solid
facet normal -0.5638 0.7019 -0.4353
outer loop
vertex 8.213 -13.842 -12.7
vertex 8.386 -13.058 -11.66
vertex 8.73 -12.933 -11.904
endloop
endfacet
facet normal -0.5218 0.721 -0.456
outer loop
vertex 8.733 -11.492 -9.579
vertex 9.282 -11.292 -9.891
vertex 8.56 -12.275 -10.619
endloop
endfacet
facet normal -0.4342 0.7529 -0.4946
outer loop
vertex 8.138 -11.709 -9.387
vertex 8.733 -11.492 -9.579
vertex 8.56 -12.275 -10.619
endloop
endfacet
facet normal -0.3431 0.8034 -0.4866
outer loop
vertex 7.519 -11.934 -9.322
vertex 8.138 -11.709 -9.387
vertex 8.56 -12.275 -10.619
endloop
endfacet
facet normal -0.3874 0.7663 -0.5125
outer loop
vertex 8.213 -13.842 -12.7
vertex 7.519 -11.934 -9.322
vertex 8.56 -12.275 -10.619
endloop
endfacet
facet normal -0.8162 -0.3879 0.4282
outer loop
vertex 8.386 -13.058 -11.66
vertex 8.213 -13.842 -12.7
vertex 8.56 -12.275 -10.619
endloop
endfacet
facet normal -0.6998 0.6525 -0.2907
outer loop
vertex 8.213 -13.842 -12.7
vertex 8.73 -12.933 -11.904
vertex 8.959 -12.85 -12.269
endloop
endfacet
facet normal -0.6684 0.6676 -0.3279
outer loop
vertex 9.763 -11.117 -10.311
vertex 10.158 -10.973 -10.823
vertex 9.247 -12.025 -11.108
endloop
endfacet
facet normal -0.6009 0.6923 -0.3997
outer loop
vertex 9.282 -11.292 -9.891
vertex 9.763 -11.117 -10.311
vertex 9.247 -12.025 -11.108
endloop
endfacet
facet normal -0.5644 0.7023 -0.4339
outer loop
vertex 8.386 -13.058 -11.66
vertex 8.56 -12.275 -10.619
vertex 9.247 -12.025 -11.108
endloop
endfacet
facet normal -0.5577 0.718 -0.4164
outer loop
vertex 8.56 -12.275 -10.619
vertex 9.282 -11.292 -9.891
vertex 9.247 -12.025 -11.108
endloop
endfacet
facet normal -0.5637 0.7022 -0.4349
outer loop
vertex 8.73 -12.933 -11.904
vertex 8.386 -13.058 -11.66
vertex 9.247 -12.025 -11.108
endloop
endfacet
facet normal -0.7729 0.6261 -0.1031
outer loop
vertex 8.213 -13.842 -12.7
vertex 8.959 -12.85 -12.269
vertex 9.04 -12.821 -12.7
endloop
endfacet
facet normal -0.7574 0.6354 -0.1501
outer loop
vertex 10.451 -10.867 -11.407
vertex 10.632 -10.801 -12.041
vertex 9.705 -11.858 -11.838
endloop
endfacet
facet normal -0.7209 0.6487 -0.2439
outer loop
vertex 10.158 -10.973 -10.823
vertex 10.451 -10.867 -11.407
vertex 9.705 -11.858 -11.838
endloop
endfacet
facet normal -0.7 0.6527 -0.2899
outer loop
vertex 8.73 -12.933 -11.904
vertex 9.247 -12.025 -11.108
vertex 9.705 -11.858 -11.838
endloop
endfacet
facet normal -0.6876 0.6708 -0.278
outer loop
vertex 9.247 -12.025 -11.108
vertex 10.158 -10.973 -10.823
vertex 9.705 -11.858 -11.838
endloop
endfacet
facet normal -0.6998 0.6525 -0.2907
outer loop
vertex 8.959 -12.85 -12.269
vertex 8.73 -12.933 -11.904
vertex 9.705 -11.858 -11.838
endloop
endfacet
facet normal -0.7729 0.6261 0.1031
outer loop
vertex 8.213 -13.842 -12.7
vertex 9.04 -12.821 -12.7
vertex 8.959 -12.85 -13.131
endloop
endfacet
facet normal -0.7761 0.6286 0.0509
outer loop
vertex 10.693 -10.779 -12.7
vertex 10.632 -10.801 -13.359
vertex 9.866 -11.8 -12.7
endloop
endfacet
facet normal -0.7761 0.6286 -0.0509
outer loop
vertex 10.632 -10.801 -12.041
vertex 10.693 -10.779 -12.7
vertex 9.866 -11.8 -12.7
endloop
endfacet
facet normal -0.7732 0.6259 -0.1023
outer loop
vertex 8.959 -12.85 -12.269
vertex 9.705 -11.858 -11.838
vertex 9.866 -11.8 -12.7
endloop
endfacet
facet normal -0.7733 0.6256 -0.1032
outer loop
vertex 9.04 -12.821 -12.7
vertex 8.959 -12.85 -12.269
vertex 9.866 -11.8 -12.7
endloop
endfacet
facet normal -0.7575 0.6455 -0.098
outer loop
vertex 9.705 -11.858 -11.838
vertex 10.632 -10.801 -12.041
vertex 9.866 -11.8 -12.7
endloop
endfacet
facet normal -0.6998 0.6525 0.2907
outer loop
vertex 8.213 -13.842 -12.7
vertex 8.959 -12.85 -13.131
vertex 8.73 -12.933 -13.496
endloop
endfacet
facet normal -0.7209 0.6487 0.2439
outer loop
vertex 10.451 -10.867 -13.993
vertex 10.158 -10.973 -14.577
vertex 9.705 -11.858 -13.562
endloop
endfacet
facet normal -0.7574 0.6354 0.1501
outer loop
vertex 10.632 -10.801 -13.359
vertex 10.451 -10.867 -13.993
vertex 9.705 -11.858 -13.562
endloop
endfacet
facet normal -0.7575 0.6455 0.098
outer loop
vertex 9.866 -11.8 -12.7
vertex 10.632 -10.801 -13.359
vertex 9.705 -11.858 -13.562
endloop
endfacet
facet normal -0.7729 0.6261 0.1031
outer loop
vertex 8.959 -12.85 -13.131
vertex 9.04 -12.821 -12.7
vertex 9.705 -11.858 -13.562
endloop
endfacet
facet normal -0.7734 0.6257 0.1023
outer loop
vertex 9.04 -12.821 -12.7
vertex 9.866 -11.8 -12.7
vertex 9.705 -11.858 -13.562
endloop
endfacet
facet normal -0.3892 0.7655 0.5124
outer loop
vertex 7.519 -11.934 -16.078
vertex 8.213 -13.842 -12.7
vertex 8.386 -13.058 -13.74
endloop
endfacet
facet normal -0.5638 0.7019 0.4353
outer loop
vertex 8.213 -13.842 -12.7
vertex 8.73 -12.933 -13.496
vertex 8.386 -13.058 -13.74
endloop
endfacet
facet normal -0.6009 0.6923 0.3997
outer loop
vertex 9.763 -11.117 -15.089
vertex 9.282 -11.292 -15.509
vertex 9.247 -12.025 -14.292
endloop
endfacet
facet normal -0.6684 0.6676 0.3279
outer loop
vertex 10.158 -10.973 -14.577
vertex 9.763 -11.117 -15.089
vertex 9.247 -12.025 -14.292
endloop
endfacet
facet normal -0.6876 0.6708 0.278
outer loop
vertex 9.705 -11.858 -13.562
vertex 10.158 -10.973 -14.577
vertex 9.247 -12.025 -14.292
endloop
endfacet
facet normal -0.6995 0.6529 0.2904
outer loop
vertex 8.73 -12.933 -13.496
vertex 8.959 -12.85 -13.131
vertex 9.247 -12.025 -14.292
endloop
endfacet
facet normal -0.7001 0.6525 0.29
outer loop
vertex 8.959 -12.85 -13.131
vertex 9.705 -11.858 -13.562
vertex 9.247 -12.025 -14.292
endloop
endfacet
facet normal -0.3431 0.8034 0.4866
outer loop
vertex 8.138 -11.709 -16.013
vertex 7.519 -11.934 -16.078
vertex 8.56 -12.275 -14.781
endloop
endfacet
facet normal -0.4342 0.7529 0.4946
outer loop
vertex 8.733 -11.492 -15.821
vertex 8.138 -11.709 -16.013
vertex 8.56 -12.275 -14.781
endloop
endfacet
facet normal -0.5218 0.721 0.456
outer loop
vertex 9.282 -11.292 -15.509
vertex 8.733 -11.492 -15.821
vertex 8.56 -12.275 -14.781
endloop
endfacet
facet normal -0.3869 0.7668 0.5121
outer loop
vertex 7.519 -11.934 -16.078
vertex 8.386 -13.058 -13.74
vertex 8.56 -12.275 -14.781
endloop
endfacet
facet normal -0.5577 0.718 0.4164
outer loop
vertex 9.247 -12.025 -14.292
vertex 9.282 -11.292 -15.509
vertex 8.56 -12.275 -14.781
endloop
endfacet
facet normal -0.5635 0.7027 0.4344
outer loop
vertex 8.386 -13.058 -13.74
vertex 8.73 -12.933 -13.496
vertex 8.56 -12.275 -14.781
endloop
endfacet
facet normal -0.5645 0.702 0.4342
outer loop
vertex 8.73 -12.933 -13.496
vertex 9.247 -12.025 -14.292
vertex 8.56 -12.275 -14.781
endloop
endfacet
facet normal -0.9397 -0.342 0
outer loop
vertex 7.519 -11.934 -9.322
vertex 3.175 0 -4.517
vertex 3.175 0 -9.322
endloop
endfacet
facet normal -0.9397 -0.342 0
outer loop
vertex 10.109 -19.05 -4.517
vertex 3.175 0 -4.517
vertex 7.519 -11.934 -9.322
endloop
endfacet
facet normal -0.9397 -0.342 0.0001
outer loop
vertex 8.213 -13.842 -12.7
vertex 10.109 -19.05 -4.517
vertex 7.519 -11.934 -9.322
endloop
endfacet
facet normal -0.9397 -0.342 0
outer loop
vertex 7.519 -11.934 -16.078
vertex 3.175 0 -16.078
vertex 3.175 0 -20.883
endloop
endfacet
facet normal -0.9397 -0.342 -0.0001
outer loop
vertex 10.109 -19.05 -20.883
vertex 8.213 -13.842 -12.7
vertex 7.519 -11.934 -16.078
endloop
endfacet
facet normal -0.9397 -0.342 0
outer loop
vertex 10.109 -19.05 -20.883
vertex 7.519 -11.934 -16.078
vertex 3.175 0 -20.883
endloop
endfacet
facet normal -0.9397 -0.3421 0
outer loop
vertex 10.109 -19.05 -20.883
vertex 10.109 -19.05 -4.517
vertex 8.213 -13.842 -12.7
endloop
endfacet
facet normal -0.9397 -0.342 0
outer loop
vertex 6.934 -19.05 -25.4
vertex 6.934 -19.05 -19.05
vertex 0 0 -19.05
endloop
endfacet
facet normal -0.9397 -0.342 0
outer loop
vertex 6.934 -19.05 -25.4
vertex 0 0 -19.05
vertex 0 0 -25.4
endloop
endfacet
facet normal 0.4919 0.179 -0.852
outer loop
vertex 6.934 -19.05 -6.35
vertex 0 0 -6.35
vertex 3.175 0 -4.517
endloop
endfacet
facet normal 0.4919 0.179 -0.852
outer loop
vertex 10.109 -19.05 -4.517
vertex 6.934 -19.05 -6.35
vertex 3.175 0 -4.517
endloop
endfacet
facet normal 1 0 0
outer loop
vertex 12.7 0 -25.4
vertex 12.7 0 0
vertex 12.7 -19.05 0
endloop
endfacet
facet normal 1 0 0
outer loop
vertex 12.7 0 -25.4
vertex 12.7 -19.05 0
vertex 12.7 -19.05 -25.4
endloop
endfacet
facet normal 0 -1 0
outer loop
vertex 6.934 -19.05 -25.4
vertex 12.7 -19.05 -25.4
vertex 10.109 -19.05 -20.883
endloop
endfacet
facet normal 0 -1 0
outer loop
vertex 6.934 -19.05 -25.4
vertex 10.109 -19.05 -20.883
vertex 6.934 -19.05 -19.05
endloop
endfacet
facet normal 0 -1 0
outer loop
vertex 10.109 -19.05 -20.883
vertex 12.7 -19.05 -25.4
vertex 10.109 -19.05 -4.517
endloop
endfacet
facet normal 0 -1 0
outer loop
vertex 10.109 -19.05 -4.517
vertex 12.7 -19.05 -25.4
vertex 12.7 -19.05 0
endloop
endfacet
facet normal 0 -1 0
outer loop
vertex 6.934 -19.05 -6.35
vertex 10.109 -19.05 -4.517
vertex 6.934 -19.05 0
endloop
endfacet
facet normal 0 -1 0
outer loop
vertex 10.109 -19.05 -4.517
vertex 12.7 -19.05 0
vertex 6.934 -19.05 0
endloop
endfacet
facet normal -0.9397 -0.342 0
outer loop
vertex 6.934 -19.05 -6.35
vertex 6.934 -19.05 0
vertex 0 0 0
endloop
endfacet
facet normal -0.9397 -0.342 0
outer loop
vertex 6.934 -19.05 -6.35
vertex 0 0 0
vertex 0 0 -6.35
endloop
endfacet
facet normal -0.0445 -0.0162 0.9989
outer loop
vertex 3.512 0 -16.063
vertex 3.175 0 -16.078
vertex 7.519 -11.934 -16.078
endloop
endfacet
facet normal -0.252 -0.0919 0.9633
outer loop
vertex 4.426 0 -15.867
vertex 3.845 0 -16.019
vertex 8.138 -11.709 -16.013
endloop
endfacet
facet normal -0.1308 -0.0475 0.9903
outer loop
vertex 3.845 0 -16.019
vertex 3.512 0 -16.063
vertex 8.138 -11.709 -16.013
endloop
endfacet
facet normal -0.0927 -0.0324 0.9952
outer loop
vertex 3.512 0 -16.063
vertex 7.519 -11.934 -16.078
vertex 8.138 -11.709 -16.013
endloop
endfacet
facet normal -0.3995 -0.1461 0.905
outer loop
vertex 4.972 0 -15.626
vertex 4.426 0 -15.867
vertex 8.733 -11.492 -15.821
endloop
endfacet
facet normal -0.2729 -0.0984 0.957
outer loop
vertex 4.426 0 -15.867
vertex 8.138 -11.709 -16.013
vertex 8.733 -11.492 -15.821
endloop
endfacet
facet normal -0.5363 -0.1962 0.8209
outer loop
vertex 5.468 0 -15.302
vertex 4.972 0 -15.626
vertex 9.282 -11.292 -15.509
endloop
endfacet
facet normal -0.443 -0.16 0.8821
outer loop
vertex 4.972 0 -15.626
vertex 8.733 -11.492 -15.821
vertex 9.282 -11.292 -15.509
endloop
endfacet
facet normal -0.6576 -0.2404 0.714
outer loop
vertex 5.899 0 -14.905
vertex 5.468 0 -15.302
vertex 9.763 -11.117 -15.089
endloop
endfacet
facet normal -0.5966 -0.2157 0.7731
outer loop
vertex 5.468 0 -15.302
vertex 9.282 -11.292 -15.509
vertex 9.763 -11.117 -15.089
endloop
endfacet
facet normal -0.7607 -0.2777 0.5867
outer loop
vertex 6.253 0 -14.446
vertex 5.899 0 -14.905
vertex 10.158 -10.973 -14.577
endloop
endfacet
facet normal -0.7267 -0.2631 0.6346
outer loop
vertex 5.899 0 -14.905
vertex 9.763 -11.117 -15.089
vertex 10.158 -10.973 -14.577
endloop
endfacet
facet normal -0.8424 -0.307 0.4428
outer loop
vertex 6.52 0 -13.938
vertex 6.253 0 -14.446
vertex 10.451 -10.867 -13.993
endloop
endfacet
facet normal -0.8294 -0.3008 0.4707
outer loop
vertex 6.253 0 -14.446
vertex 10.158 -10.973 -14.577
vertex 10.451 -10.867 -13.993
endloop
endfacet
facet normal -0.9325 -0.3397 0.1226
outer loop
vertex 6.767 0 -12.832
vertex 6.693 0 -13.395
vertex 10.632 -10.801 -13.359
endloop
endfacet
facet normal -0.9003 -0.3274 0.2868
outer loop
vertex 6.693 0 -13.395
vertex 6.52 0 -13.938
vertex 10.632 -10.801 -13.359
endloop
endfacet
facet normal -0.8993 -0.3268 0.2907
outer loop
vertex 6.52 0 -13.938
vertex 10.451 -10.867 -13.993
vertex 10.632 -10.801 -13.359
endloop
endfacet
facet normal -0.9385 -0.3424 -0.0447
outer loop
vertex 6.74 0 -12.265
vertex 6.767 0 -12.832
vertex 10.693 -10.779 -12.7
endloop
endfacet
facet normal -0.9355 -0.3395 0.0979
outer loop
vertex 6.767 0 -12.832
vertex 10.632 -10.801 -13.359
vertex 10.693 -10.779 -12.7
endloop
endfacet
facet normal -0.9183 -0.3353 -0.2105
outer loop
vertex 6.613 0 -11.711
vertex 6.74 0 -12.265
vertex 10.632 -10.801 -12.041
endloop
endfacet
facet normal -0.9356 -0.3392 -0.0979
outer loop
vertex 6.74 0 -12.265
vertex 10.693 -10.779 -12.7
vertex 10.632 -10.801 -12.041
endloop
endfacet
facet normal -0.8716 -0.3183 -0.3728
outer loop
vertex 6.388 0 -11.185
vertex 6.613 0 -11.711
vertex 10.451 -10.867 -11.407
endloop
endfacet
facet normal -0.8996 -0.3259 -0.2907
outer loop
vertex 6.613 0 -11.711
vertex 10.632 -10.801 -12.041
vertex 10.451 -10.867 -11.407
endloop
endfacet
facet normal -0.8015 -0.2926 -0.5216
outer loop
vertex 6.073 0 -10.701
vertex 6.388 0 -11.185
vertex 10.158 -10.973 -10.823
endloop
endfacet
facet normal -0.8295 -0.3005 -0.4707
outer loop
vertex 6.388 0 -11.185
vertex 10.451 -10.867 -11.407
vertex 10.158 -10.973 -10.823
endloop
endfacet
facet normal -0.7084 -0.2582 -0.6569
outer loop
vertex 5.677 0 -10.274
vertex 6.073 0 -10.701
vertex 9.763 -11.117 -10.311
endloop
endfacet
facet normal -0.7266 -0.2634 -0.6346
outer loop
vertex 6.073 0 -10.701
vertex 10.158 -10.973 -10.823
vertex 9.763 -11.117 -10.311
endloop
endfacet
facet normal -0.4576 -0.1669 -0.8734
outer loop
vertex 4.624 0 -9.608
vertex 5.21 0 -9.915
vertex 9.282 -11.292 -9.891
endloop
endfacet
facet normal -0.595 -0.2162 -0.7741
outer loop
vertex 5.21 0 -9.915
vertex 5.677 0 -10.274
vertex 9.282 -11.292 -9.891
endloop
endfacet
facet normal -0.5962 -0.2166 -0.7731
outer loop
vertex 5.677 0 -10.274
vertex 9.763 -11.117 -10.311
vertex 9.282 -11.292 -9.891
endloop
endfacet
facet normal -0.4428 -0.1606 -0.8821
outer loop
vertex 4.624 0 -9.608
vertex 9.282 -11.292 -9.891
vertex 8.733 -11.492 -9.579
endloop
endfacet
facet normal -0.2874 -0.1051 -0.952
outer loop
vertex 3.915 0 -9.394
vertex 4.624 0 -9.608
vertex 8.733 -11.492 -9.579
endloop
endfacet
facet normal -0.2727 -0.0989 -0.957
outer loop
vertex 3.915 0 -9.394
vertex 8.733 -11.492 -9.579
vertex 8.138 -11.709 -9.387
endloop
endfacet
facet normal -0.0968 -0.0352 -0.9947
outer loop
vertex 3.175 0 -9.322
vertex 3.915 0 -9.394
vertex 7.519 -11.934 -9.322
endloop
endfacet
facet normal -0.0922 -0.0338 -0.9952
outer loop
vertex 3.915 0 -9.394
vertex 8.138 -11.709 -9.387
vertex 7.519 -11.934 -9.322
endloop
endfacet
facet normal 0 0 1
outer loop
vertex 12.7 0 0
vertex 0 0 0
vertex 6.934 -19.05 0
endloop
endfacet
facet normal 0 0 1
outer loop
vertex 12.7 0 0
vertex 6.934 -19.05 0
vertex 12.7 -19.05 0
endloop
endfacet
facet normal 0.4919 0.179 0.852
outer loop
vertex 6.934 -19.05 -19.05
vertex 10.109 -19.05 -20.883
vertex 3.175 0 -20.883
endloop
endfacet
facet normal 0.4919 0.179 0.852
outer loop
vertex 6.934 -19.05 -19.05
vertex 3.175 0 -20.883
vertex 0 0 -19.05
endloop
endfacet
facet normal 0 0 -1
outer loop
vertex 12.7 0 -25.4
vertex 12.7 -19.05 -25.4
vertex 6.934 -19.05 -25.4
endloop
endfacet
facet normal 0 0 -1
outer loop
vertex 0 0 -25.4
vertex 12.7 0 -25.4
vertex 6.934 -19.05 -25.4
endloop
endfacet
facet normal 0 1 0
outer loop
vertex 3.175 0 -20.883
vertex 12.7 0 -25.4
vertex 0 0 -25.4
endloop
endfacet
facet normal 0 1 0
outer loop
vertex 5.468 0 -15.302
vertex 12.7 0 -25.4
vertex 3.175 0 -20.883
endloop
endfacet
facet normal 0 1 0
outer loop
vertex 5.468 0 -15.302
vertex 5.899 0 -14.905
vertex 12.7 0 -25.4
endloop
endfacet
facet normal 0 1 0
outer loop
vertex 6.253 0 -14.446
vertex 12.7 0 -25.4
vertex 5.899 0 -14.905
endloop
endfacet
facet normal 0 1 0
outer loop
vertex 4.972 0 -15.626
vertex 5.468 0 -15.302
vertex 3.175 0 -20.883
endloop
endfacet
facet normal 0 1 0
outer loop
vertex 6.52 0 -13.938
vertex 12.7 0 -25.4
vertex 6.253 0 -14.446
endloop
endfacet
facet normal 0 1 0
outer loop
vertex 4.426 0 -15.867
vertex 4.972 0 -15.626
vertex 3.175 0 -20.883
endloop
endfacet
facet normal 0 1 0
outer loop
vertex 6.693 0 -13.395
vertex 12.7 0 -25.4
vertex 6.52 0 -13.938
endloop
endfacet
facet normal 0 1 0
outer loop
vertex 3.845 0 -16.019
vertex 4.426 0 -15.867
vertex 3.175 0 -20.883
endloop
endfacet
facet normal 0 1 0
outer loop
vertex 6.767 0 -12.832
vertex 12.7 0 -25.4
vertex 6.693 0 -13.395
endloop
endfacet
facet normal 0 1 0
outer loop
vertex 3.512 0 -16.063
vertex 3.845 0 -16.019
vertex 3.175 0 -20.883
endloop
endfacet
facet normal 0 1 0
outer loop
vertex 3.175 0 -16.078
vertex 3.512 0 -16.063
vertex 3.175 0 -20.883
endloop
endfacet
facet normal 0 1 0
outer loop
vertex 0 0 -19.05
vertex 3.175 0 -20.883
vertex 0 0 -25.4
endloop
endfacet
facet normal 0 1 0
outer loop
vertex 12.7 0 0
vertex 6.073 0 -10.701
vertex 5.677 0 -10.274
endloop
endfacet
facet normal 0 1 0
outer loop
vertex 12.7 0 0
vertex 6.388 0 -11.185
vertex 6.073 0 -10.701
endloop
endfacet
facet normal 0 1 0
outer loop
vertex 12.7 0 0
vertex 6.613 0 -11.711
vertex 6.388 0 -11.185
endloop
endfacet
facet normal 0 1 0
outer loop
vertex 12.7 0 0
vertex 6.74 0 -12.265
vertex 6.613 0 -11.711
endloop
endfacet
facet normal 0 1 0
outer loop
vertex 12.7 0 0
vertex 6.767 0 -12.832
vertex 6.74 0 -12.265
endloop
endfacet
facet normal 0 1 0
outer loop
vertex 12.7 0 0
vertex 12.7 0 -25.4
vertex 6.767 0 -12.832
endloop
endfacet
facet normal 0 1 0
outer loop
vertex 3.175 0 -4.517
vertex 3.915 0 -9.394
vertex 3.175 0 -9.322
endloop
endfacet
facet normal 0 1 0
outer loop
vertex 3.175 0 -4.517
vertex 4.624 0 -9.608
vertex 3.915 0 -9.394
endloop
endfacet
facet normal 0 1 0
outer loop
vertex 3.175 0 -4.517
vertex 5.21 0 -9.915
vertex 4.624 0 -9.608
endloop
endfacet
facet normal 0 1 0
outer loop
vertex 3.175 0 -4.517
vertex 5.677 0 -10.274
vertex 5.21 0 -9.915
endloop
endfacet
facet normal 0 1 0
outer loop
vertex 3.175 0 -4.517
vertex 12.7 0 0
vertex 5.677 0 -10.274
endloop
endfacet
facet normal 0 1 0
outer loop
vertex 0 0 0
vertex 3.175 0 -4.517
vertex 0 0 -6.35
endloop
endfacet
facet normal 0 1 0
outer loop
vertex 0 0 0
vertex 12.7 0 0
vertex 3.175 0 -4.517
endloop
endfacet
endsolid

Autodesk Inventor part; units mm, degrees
ref_plane "YZ Plane" through (0, 0, 0) normal (1, 0, 0) x (0, 1, 0)
ref_plane "XZ Plane" through (0, 0, 0) normal (0, 1, 0) x (-1, 0, 0)
sketch "Sketch1" plane through (0, 0, 0) normal (0, 1, 0) x (-1, 0, 0)
  line L0 (0, 0) -> (-12.7, 0)
  line L1 (-12.7, 0) -> (-12.7, -25.4)
  line L2 (-12.7, -25.4) -> (0, -25.4)
  line L3 (0, -25.4) -> (0, 0)
  line L4 (0, -12.7) -> (-12.7, -12.7) construction
  line L5 (-3.175, -25.4) -> (-3.175, 0)
  line L6 (-3.175, -20.8831) -> (0, -19.05)
  line L7 (-3.175, -4.5169) -> (0, -6.35)
  point P0 (-3.175, -12.7)
  point P1 (0, -6.35)
  dimension "d0" = 12.7
  dimension "d7" = 25.4
  dimension "d34" = 3.175
  dimension "d35" = 60
  dimension "d36" = 12.7
extrude "Extrusion2" add sketch "Sketch1" against normal blind 19.05
sketch "Sketch6" plane through (0, 0, 0) normal (0, 0, 1) x (-1, 0, 0)
  line L0 (0, 0) -> (-12.7, 0) projected
  line L1 (-12.7, 0) -> (-12.7, 19.05) projected
  line L2 (-12.7, 19.05) -> (0, 19.05) projected
  line L3 (0, 0) -> (0, 19.05) projected
  line L4 (0, 0) -> (-6.9336, 19.05)
  dimension "d41" = 70
sweep "Sweep2" cut profiles "Sketch1" path "Sketch6" path curves L4 contours L3 L6 L5 L7
ref_plane "Work Plane5" through (3.175, 0, -25.4) normal (-0.3420201, 0.9396926, 0) x (0, 0, 1)
ref_plane "Work Plane4" through (0, 0, -25.4) normal (0.9396926, 0.3420201, 0) x (0, 0, 1)
sketch "Sketch7" plane through (3.175, 0, -25.4) normal (-0.3420201, 0.9396926, 0) x (0, 0, 1)
  point P0 (12.7, 0)
hole "Hole3" at (3.175, 0, -12.7) direction (0.3420201, -0.9396926, 0) diameter 6.7564 depth 12.7 tip angle 118
split "Split2" plane through (0, 0, -25.4) removes the side toward (-0.9396926, -0.3420201, 0)
equation "\"d41\" = slopeAngle"
equation "\"slopeAngle\" = 70deg"
equation "\"d44\" = -slopeAngle"
properties material "Steel, Alloy"
